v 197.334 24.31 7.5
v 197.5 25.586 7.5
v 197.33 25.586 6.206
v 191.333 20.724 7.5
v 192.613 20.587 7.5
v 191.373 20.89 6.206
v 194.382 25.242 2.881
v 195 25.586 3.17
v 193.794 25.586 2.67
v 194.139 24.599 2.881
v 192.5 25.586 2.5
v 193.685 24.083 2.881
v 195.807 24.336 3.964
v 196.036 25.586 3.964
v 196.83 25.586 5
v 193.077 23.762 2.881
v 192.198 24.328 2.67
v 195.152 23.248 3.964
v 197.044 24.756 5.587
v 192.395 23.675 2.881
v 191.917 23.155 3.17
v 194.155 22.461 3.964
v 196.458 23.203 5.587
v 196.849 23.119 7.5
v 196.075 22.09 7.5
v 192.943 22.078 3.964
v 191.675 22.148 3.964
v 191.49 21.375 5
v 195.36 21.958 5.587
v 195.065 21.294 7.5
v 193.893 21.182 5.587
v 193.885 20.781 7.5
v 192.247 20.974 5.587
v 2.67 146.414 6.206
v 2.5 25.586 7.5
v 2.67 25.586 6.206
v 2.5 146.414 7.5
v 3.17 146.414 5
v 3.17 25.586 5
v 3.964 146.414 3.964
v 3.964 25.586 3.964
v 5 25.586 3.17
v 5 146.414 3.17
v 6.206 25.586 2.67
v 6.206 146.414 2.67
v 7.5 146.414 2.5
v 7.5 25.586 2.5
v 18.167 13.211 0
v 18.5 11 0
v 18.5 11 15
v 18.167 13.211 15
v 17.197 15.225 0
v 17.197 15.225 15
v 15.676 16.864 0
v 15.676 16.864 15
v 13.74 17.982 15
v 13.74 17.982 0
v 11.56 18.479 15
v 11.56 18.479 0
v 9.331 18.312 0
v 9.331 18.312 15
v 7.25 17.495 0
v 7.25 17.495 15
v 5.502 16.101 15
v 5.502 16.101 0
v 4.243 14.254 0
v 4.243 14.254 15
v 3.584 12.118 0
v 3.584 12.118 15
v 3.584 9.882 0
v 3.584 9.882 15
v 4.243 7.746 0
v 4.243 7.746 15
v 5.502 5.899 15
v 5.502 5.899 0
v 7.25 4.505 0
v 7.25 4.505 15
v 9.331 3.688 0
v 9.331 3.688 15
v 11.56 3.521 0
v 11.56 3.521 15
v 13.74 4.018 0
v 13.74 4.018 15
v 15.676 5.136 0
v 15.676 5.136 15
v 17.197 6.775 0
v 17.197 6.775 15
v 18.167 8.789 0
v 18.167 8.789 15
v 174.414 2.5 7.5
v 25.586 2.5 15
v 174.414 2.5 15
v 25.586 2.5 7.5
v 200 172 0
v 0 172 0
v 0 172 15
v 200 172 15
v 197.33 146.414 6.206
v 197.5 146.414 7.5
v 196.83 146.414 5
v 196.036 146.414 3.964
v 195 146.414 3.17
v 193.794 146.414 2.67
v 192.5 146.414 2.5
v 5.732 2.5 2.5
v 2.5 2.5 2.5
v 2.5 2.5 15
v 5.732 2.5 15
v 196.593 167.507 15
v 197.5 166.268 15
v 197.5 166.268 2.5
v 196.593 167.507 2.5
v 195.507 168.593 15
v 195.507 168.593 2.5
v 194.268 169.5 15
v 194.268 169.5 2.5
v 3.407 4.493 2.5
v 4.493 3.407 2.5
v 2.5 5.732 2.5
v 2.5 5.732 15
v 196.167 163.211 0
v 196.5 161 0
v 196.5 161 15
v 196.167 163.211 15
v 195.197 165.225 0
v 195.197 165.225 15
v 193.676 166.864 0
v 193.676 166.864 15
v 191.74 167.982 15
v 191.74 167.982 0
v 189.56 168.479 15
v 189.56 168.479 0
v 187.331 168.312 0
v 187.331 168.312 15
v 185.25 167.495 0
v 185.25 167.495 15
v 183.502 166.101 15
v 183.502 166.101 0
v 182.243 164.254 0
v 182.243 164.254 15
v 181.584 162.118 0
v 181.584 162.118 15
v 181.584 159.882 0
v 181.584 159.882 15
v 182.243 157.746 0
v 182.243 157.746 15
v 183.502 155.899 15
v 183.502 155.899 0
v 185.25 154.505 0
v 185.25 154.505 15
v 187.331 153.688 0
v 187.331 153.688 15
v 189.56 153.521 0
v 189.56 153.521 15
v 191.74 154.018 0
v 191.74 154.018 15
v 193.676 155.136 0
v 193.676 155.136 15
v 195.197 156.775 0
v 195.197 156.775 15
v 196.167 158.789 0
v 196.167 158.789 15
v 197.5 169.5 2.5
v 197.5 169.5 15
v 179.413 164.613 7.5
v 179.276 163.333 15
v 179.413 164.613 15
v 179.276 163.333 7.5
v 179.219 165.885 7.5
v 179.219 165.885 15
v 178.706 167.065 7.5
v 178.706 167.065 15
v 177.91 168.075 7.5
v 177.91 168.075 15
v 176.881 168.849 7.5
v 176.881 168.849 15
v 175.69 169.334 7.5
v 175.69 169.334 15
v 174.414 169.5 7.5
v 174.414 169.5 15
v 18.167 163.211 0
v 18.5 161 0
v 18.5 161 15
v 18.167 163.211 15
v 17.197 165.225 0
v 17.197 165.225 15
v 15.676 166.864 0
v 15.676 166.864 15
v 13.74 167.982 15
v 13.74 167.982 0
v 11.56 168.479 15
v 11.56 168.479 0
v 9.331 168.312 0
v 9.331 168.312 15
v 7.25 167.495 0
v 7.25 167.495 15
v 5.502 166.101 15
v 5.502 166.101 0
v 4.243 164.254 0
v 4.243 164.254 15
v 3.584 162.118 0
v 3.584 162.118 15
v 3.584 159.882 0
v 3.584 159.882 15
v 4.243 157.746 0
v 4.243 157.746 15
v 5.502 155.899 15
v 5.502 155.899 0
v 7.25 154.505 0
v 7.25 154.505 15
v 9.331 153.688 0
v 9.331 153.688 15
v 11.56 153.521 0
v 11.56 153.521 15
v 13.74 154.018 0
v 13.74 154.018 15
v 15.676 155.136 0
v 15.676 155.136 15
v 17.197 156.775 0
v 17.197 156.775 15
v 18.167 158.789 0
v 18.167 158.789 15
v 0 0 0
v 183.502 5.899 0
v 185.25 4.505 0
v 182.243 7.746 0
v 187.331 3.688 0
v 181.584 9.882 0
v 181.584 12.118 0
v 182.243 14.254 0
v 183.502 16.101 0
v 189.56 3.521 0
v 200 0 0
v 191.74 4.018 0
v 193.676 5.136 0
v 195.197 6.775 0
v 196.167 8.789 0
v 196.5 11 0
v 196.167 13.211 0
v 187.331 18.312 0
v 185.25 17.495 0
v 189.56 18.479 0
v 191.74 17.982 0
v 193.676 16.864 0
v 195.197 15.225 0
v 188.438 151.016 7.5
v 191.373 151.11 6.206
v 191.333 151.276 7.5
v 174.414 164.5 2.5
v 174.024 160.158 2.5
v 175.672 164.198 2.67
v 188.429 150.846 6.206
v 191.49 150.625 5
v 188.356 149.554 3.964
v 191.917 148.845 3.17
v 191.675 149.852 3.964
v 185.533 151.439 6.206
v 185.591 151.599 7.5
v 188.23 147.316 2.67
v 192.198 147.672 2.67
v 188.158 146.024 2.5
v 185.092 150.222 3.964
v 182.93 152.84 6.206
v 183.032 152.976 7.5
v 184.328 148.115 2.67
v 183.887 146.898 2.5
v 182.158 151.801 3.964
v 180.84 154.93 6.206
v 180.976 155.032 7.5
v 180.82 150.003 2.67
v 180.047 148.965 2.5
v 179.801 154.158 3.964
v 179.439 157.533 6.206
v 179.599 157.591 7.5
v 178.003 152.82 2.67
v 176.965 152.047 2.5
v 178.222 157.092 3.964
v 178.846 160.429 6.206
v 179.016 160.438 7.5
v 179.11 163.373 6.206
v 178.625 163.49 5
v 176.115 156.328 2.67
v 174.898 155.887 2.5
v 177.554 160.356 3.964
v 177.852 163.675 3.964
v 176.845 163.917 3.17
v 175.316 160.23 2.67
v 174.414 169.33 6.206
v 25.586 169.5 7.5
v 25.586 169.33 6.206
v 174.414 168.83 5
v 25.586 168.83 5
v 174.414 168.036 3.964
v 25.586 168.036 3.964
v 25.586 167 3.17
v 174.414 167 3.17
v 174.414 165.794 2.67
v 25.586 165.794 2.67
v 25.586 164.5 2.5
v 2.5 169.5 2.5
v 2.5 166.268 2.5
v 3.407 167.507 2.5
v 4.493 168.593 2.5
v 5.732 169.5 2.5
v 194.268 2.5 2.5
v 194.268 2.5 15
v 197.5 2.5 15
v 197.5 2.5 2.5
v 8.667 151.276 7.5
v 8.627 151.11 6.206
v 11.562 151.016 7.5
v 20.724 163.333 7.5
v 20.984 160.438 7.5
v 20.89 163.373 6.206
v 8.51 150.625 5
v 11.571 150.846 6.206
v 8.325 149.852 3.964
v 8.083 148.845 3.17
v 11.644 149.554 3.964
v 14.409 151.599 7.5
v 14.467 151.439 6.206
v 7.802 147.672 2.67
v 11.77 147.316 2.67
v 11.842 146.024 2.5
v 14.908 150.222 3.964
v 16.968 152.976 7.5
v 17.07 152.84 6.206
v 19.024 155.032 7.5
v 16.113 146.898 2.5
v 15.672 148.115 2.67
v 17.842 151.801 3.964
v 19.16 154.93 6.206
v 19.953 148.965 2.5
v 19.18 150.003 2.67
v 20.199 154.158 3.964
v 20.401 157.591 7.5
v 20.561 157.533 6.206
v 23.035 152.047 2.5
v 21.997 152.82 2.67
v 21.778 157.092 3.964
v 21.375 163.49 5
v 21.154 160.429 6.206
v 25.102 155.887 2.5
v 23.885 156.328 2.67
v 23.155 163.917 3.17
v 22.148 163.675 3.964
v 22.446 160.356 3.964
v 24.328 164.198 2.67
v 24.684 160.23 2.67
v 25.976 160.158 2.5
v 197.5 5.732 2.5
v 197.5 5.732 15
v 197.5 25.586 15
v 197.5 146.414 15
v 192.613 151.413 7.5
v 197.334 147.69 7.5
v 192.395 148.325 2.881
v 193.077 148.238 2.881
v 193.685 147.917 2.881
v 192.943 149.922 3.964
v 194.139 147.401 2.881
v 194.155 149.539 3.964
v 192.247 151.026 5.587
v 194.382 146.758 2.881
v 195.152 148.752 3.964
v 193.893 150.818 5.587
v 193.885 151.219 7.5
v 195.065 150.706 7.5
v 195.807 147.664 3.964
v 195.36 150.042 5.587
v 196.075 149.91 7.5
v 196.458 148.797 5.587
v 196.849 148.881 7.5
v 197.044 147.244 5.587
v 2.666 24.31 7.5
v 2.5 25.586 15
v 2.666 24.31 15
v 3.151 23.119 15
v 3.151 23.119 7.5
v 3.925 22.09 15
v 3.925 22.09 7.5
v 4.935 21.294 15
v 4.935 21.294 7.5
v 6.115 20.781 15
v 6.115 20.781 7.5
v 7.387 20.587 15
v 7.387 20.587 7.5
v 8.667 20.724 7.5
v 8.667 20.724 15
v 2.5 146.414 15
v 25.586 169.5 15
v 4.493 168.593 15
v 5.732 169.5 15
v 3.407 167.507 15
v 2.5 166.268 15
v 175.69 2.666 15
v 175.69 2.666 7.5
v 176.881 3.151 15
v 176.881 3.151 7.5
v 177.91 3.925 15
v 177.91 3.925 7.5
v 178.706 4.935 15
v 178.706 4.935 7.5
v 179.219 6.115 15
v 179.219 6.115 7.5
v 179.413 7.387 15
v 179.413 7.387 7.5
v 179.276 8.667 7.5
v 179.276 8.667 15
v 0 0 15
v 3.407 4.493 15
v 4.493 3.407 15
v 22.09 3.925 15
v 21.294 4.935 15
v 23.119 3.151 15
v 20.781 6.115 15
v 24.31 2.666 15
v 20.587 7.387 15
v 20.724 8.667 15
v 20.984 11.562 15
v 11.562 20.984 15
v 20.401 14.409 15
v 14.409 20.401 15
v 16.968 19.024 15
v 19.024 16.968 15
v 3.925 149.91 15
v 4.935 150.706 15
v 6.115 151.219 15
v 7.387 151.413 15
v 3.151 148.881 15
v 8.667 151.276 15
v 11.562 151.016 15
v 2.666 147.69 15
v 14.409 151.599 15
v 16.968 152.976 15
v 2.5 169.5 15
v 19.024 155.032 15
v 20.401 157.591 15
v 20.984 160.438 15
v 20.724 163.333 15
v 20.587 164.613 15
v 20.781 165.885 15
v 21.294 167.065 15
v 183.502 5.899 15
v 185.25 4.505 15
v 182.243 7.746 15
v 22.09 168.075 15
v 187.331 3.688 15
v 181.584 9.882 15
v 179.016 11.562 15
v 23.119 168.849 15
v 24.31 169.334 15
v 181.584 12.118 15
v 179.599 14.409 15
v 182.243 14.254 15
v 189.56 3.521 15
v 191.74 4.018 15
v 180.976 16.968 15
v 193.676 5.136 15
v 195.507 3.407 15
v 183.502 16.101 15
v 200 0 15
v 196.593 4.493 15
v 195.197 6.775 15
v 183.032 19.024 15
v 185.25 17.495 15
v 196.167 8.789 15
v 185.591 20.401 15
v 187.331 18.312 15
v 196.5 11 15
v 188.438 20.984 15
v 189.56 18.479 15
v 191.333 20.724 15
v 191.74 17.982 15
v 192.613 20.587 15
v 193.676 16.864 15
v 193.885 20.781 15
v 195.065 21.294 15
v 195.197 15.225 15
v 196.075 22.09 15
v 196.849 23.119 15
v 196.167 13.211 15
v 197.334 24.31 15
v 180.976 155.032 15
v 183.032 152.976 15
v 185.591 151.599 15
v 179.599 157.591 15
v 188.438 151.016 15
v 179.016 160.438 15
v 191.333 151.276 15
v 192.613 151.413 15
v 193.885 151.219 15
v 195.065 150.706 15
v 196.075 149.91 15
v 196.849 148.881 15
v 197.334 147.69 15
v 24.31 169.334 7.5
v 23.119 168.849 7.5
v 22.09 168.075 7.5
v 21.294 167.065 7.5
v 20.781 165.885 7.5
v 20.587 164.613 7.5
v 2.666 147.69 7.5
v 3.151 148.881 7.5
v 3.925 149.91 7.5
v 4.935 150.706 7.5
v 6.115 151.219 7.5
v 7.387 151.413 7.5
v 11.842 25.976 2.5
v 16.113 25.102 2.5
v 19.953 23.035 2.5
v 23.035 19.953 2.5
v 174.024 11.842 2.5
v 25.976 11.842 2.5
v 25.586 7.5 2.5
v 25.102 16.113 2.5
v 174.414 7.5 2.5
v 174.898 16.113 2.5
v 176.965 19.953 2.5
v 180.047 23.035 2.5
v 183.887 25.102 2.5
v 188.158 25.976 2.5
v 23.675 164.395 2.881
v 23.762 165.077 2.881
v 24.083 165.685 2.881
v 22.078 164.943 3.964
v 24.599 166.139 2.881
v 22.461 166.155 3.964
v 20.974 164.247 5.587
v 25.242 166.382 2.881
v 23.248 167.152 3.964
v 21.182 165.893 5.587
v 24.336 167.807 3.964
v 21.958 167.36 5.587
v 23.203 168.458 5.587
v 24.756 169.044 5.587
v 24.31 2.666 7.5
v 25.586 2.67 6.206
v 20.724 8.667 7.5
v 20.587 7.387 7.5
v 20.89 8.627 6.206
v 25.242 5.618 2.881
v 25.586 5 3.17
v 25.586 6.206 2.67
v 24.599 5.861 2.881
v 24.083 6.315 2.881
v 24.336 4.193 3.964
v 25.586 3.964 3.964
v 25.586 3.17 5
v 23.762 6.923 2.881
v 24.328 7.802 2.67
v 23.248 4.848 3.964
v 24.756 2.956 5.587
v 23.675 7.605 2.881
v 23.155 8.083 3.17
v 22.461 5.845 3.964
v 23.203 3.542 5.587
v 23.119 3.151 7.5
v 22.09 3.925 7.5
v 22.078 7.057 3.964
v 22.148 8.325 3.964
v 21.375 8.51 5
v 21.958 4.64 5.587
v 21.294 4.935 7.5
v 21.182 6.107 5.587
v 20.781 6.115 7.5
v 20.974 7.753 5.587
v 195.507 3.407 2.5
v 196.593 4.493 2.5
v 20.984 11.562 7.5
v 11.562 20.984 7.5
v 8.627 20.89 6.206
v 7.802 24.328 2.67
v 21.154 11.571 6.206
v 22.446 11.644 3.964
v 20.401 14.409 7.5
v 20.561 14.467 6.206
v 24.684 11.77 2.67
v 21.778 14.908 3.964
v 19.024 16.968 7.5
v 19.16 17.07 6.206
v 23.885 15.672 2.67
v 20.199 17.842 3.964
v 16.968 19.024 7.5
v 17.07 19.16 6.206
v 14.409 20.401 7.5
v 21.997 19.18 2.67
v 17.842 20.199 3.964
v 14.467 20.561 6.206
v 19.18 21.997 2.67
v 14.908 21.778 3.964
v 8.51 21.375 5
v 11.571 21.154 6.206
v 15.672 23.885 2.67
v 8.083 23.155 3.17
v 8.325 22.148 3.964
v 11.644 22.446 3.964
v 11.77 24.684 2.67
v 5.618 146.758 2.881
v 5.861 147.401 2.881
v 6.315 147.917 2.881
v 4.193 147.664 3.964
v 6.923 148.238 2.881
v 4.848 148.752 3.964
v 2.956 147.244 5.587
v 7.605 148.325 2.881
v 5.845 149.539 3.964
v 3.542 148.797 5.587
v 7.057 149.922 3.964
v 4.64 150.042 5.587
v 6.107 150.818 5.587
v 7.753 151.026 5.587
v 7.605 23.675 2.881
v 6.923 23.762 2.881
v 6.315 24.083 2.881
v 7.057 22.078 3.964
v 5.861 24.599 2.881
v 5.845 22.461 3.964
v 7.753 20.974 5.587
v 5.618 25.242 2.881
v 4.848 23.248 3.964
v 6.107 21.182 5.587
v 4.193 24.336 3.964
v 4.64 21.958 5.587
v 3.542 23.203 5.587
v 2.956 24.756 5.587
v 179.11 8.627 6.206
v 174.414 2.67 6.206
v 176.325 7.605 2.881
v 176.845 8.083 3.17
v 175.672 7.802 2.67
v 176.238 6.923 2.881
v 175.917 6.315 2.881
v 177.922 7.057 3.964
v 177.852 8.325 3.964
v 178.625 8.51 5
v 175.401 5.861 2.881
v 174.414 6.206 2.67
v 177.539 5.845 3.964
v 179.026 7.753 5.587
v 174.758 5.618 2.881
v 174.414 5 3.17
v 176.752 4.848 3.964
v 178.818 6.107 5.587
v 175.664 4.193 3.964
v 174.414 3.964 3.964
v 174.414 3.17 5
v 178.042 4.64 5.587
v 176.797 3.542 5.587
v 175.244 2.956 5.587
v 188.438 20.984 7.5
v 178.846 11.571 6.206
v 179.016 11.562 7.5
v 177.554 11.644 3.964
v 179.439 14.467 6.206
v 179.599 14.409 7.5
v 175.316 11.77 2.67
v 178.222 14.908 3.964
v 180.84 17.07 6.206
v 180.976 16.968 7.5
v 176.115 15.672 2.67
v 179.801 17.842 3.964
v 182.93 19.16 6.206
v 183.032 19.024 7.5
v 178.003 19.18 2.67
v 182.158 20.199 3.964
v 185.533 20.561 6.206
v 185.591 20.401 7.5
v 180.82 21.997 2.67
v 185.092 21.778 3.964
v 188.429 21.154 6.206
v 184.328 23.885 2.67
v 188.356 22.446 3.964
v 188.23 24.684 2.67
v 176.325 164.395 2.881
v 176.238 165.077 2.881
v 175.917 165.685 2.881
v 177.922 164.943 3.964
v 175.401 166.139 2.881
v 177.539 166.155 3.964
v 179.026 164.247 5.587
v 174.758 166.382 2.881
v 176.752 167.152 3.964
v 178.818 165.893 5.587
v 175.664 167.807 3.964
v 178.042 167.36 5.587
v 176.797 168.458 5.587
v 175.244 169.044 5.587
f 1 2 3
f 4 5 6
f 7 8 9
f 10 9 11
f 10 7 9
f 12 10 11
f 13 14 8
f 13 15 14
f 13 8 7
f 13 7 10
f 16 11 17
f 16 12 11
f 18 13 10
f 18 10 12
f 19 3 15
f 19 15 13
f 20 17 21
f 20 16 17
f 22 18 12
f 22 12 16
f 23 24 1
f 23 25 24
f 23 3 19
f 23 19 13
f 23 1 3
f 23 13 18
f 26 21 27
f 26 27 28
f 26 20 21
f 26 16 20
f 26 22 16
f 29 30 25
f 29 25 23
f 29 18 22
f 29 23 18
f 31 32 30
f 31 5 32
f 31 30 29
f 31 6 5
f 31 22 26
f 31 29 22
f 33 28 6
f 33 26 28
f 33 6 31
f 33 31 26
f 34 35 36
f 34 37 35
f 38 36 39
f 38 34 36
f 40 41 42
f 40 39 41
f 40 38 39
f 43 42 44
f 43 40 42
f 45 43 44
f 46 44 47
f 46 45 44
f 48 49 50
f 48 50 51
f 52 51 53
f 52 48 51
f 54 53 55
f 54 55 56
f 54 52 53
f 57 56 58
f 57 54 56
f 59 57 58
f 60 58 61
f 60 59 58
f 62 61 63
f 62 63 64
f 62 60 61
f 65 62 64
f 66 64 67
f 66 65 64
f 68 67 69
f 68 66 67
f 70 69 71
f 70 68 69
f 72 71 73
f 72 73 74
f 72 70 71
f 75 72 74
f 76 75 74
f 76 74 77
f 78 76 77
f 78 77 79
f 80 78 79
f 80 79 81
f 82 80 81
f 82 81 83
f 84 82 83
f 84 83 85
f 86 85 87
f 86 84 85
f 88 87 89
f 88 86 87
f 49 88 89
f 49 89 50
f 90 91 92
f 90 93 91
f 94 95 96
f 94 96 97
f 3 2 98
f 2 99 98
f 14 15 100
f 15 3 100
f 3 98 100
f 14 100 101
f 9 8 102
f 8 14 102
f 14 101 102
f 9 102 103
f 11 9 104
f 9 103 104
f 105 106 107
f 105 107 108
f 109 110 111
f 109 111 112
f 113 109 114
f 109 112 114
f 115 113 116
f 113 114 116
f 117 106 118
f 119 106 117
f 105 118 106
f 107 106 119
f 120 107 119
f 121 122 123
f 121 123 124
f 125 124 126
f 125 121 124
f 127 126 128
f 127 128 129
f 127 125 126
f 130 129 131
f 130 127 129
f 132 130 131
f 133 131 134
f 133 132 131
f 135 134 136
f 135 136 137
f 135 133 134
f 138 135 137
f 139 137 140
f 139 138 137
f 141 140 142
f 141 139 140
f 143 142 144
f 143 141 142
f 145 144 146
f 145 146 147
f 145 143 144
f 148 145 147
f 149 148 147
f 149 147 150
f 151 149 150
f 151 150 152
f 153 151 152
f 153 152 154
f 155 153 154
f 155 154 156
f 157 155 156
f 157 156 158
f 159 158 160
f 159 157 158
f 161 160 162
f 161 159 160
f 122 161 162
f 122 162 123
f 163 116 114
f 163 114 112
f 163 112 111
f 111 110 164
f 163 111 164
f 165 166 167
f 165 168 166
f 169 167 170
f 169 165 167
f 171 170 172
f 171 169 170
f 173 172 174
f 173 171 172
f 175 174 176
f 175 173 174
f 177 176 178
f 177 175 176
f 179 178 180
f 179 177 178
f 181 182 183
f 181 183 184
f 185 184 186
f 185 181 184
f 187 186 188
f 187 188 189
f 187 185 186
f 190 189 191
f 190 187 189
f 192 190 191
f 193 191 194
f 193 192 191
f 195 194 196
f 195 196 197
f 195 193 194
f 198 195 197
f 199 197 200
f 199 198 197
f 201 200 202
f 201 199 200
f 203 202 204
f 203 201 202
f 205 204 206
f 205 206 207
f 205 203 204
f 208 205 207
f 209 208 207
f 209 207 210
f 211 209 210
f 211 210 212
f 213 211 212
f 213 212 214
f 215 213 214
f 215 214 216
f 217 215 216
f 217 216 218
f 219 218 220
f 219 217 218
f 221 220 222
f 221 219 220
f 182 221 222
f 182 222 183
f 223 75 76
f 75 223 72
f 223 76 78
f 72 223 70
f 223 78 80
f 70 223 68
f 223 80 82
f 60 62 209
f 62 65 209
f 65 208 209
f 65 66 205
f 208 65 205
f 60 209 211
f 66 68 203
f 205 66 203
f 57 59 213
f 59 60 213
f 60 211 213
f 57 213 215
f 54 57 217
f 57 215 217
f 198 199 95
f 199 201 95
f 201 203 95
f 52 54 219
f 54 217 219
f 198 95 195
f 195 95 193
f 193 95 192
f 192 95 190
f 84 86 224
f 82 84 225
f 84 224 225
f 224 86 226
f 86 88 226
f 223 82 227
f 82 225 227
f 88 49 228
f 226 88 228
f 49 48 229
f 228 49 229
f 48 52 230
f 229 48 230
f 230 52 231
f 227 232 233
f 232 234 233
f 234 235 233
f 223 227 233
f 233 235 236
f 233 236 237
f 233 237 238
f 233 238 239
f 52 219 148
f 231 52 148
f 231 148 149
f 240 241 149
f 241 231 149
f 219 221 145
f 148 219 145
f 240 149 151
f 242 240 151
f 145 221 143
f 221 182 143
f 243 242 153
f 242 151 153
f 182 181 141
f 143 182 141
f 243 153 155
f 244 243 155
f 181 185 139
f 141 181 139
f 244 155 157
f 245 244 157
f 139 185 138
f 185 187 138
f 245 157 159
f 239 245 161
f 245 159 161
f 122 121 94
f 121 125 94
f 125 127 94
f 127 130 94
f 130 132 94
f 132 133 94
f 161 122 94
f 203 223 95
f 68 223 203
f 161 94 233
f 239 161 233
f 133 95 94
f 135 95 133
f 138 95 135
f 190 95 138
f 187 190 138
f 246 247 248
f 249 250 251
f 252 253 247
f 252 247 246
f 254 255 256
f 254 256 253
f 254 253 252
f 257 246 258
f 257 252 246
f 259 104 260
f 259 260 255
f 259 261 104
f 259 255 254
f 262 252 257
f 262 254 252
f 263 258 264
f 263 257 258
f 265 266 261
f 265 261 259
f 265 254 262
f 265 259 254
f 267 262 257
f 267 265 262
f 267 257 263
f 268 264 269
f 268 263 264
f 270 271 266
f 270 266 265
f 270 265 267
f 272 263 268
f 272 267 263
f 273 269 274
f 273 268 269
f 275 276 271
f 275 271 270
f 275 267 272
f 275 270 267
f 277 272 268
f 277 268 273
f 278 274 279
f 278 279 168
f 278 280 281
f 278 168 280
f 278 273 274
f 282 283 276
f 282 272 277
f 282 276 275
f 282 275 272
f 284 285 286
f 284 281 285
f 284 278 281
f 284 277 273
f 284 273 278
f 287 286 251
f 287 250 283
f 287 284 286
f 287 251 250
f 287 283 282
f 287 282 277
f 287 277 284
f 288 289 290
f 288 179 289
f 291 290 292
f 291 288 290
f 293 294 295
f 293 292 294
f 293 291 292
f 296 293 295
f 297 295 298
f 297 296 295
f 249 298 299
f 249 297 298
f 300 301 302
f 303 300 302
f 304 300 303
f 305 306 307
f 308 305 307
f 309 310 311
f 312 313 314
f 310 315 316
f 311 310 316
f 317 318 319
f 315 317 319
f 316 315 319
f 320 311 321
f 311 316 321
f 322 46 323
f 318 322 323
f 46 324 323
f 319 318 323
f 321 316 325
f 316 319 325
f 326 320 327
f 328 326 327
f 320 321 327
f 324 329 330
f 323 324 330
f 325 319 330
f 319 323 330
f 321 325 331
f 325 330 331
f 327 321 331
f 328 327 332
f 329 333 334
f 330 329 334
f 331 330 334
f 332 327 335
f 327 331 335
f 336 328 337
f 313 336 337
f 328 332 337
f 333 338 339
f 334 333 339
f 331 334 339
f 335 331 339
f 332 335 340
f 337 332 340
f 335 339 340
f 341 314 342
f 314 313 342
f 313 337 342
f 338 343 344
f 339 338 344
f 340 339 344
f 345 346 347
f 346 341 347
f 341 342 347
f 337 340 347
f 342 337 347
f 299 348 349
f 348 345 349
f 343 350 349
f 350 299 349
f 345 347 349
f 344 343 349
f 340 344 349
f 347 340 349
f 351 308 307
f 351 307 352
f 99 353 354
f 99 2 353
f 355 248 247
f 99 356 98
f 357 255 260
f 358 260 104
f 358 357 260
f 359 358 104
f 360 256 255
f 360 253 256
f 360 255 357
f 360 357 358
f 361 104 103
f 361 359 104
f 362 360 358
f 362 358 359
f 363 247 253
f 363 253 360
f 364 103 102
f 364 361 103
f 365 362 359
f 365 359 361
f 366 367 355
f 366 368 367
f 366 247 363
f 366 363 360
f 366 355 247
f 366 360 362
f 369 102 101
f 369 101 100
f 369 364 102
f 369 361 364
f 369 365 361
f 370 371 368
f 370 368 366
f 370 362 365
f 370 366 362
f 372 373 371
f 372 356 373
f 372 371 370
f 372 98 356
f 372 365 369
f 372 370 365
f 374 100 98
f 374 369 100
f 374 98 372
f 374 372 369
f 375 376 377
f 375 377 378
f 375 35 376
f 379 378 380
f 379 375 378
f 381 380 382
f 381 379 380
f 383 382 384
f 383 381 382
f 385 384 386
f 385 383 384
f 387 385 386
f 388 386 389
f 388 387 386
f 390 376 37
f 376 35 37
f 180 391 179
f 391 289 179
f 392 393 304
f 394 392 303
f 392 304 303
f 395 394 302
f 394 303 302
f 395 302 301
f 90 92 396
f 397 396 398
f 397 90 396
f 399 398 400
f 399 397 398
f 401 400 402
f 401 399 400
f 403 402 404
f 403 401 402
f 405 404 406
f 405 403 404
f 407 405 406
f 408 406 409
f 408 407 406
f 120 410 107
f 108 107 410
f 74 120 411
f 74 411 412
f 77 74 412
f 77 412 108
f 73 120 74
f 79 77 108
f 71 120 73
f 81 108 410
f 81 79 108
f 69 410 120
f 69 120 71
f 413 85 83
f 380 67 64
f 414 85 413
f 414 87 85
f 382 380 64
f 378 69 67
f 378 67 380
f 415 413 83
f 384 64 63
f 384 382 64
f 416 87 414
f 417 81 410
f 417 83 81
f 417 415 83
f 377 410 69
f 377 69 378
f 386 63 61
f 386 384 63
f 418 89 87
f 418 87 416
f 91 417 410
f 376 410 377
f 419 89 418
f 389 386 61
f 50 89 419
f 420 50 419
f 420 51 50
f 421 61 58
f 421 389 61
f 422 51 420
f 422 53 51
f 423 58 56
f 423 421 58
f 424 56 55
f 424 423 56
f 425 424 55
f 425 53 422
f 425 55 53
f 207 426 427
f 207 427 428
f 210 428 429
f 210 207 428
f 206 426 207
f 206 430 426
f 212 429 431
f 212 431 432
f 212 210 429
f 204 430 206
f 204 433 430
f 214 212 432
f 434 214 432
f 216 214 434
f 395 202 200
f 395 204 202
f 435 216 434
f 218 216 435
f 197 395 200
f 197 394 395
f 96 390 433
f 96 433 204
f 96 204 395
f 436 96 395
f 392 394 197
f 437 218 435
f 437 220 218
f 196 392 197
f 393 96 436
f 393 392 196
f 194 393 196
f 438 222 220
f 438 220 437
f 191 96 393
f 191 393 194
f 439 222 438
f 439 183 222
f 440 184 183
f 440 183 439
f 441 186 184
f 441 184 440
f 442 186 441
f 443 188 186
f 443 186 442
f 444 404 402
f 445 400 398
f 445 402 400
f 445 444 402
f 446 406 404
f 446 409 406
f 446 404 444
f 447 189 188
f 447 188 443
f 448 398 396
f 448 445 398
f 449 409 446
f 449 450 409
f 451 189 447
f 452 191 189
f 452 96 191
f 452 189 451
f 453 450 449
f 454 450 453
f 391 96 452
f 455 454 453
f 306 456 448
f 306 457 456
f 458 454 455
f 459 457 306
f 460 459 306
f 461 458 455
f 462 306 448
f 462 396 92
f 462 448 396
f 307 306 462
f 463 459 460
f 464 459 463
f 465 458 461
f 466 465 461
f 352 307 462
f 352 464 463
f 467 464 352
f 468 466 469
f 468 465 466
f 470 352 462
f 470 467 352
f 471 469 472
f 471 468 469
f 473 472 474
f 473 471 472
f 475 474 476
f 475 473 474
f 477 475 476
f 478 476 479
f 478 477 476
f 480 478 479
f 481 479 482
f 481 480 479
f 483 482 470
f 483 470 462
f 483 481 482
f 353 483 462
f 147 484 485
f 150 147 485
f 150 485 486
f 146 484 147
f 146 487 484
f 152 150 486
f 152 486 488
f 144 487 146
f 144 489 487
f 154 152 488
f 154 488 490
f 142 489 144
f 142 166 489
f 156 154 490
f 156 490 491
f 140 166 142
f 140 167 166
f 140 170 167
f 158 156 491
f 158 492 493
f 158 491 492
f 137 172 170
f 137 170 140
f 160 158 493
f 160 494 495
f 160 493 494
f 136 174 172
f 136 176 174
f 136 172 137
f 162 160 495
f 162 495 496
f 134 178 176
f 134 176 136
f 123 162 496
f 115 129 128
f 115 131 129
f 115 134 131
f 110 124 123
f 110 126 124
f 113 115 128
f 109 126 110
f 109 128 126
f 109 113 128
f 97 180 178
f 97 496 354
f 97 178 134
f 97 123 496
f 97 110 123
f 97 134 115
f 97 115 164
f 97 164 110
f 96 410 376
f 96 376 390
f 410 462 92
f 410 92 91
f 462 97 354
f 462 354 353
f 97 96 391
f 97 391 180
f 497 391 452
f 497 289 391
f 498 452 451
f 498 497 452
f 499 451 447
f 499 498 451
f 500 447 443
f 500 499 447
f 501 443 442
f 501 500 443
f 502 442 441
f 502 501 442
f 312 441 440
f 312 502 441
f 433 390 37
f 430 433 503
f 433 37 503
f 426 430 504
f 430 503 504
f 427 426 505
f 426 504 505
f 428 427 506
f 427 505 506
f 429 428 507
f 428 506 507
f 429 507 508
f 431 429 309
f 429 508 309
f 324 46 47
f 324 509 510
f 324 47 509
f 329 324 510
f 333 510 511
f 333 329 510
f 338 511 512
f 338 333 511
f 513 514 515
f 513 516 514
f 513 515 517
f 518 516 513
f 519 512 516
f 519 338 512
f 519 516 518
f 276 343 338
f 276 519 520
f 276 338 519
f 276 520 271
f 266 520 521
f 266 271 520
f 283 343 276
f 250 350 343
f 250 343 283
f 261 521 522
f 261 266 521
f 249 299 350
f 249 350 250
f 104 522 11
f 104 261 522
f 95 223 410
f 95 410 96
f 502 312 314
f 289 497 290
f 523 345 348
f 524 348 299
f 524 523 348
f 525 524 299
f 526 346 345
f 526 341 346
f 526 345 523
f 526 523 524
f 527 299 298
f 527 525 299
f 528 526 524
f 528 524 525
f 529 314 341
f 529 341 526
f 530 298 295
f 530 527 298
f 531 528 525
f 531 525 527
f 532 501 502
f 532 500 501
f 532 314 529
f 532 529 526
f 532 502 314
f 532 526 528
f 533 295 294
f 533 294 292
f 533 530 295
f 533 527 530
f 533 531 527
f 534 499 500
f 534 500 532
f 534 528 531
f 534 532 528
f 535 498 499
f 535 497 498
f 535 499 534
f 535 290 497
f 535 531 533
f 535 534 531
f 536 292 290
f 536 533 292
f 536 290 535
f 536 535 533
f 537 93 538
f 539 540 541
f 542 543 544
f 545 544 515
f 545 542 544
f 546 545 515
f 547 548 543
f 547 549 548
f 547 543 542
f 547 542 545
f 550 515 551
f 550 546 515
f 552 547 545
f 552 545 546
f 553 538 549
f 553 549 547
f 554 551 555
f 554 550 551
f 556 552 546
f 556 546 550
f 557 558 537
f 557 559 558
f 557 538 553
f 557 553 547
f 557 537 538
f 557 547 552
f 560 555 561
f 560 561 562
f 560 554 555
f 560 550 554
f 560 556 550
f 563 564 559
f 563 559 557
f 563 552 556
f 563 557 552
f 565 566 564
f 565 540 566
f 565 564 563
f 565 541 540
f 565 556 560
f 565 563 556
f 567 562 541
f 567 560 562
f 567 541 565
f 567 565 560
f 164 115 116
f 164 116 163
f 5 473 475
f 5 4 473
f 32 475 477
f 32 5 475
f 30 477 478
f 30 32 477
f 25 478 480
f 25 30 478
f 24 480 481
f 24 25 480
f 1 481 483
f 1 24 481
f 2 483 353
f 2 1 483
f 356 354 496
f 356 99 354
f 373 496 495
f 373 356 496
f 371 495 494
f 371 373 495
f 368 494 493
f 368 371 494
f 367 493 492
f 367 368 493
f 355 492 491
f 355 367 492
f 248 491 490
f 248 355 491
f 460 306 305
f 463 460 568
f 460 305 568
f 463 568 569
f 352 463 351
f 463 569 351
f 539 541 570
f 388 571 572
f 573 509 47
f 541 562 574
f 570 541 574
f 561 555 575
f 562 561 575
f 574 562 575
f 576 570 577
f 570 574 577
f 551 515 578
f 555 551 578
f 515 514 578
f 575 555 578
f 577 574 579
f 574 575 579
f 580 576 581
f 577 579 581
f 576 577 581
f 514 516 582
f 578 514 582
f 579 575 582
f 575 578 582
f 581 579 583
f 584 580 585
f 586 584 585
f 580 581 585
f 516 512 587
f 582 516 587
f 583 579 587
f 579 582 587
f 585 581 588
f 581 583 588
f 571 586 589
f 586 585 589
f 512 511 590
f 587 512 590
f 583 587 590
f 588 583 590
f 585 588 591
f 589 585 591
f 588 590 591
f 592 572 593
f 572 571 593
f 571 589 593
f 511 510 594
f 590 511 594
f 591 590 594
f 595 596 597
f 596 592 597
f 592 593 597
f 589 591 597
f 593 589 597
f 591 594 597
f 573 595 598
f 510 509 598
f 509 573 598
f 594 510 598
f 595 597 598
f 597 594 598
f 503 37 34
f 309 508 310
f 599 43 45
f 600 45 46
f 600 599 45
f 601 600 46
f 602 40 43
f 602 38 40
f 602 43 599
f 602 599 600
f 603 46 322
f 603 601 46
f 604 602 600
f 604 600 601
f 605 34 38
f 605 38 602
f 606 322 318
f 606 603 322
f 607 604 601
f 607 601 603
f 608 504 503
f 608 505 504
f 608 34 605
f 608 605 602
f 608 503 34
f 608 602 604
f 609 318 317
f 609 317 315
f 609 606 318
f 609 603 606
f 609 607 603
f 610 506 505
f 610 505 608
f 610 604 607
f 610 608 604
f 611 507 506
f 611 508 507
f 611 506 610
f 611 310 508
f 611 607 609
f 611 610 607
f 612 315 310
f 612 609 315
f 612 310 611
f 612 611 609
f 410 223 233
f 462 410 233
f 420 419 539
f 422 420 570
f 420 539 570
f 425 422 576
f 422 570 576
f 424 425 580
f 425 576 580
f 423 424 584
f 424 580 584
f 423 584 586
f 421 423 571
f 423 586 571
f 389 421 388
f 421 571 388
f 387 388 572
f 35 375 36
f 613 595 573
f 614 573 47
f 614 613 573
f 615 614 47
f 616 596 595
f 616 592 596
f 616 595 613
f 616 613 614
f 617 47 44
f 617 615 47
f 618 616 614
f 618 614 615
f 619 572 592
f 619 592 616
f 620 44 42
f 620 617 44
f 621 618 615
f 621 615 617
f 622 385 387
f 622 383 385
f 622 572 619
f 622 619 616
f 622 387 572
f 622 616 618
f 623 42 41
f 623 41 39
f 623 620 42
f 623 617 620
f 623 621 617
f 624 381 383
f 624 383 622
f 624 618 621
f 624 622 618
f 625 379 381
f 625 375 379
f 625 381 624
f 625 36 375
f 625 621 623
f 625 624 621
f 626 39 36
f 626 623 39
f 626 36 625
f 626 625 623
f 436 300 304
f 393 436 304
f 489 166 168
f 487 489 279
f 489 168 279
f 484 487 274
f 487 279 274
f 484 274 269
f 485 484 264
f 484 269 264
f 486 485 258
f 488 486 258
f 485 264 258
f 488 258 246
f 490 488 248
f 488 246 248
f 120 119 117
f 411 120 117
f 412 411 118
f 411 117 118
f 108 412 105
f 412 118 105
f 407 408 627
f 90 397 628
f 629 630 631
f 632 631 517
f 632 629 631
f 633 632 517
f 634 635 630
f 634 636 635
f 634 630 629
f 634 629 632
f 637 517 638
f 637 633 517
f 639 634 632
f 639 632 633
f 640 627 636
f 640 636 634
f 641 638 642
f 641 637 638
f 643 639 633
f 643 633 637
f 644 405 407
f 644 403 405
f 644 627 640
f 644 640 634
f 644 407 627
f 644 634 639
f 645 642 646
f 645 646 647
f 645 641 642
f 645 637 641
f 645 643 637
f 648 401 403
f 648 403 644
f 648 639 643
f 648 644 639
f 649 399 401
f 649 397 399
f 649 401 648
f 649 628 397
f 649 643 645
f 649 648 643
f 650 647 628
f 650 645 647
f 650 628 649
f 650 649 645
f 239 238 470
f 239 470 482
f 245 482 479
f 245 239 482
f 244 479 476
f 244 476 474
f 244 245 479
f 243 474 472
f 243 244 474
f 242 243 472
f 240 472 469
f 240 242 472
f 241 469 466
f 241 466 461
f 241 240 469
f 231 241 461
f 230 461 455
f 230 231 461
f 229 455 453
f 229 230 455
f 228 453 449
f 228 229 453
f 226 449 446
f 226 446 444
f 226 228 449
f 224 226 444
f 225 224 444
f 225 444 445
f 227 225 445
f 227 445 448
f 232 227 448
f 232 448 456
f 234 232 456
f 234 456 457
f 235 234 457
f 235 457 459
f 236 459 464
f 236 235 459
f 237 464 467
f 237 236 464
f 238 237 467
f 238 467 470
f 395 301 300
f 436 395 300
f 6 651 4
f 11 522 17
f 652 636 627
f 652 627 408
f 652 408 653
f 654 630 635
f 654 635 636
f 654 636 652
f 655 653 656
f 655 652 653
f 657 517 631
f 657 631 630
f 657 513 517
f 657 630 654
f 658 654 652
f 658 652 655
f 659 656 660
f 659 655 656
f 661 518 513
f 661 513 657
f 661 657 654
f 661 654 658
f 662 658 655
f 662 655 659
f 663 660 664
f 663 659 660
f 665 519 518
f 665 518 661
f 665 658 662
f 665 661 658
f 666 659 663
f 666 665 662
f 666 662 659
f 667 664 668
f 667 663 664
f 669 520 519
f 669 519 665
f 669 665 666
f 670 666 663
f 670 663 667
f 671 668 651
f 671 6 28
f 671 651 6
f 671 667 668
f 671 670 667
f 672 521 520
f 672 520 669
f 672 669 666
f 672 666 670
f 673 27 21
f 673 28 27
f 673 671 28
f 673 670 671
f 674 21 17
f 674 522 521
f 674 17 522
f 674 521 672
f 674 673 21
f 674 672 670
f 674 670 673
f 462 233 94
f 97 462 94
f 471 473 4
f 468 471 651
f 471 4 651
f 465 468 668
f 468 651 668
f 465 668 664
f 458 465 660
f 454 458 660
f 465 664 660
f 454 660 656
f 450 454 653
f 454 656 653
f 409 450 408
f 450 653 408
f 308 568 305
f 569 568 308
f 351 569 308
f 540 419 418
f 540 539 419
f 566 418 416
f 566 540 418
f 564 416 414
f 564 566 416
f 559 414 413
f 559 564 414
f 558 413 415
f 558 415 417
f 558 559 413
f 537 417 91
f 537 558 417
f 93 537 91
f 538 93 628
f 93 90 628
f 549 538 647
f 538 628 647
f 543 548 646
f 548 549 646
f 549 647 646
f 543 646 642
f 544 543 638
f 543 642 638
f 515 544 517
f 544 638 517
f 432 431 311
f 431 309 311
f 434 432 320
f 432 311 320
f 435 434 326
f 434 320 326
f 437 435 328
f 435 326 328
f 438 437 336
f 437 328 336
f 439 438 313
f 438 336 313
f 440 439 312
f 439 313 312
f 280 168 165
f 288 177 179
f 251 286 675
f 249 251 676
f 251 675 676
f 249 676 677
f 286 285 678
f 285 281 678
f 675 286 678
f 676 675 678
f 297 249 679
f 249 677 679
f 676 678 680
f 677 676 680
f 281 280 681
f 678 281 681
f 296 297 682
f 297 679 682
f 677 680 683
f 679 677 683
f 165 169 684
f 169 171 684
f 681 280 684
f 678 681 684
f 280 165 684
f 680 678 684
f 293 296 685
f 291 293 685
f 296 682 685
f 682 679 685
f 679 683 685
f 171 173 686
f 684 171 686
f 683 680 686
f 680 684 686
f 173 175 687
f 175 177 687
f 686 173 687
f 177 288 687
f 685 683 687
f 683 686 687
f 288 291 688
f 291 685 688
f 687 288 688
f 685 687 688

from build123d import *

# Parameters (mm, degrees)
F0_W     = 200
F0_H     = 172
F0_R     = 7.5
F1_DEPTH = 15
F2_T     = 2.5
F3_R     = 5


# Not quite as in the source:
# - a shell that OpenCascade refuses in one call is made with other operations: the cavity is built on its own and cut out


with BuildPart() as f1:
    # F0 (on Top) → F1 (new body)
    with BuildSketch(Plane.XY):
        with Locations((100, 86)):
            Rectangle(F0_W, F0_H)
        with Locations((11, 11)):
            Circle(F0_R, mode=Mode.SUBTRACT)
        with Locations((189, 11)):
            Circle(F0_R, mode=Mode.SUBTRACT)
        with Locations((11, 161)):
            Circle(F0_R, mode=Mode.SUBTRACT)
        with Locations((189, 161)):
            Circle(F0_R, mode=Mode.SUBTRACT)
    extrude(amount=F1_DEPTH)

    # F2: shell of thickness 2.5, made by hand


with BuildPart() as f2_core1:
    # F2_t2: copy of F1
    add(f1.part)

    # the walls: a layer under each face that stays
    f2_faces = [f2_core1.faces().sort_by_distance(p)[0] for p in [
        (0, 86, 7.5),
        (100, 0, 7.5),
        (200, 86, 7.5),
        (100, 172, 7.5),
        (3.5, 11, 7.5),
        (181.5, 11, 7.5),
        (3.5, 161, 7.5),
        (181.5, 161, 7.5),
        (100, 86, 0),
    ]]
    thicken(f2_faces, amount=-F2_T, mode=Mode.SUBTRACT)


with BuildPart() as f1_1:
    add(f1.part)

    # what is left inside the walls is the cavity
    f2_cavity = [f2_core1.part.solids().sort_by_distance(p)[0] for p in [
        (3.911255, 168.088745, 10.833333),
        (100, 58.166667, 14.975),
        (3.911255, 3.911255, 10.833333),
        (196.088745, 168.088745, 10.833333),
        (196.088745, 3.911255, 10.833333),
    ]]
    add(f2_cavity, mode=Mode.SUBTRACT)

    # F3
    f3_edges = [f1_1.edges().sort_by_distance(p)[0] for p in [
        (100, 169.5, 2.5),
        (16.267827, 169.5, 8.75),
        (183.732173, 169.5, 8.75),
        (18.071068, 153.928932, 2.5),
        (2.5, 155.732173, 8.75),
        (2.5, 86, 2.5),
        (2.5, 16.267827, 8.75),
        (18.071068, 18.071068, 2.5),
        (16.267827, 2.5, 8.75),
        (100, 2.5, 2.5),
        (183.732173, 2.5, 8.75),
        (181.928932, 18.071068, 2.5),
        (197.5, 16.267827, 8.75),
        (197.5, 86, 2.5),
        (197.5, 155.732173, 8.75),
        (181.928932, 153.928932, 2.5),
    ]]
    fillet(f3_edges, radius=F3_R)


solid = f1_1.part
